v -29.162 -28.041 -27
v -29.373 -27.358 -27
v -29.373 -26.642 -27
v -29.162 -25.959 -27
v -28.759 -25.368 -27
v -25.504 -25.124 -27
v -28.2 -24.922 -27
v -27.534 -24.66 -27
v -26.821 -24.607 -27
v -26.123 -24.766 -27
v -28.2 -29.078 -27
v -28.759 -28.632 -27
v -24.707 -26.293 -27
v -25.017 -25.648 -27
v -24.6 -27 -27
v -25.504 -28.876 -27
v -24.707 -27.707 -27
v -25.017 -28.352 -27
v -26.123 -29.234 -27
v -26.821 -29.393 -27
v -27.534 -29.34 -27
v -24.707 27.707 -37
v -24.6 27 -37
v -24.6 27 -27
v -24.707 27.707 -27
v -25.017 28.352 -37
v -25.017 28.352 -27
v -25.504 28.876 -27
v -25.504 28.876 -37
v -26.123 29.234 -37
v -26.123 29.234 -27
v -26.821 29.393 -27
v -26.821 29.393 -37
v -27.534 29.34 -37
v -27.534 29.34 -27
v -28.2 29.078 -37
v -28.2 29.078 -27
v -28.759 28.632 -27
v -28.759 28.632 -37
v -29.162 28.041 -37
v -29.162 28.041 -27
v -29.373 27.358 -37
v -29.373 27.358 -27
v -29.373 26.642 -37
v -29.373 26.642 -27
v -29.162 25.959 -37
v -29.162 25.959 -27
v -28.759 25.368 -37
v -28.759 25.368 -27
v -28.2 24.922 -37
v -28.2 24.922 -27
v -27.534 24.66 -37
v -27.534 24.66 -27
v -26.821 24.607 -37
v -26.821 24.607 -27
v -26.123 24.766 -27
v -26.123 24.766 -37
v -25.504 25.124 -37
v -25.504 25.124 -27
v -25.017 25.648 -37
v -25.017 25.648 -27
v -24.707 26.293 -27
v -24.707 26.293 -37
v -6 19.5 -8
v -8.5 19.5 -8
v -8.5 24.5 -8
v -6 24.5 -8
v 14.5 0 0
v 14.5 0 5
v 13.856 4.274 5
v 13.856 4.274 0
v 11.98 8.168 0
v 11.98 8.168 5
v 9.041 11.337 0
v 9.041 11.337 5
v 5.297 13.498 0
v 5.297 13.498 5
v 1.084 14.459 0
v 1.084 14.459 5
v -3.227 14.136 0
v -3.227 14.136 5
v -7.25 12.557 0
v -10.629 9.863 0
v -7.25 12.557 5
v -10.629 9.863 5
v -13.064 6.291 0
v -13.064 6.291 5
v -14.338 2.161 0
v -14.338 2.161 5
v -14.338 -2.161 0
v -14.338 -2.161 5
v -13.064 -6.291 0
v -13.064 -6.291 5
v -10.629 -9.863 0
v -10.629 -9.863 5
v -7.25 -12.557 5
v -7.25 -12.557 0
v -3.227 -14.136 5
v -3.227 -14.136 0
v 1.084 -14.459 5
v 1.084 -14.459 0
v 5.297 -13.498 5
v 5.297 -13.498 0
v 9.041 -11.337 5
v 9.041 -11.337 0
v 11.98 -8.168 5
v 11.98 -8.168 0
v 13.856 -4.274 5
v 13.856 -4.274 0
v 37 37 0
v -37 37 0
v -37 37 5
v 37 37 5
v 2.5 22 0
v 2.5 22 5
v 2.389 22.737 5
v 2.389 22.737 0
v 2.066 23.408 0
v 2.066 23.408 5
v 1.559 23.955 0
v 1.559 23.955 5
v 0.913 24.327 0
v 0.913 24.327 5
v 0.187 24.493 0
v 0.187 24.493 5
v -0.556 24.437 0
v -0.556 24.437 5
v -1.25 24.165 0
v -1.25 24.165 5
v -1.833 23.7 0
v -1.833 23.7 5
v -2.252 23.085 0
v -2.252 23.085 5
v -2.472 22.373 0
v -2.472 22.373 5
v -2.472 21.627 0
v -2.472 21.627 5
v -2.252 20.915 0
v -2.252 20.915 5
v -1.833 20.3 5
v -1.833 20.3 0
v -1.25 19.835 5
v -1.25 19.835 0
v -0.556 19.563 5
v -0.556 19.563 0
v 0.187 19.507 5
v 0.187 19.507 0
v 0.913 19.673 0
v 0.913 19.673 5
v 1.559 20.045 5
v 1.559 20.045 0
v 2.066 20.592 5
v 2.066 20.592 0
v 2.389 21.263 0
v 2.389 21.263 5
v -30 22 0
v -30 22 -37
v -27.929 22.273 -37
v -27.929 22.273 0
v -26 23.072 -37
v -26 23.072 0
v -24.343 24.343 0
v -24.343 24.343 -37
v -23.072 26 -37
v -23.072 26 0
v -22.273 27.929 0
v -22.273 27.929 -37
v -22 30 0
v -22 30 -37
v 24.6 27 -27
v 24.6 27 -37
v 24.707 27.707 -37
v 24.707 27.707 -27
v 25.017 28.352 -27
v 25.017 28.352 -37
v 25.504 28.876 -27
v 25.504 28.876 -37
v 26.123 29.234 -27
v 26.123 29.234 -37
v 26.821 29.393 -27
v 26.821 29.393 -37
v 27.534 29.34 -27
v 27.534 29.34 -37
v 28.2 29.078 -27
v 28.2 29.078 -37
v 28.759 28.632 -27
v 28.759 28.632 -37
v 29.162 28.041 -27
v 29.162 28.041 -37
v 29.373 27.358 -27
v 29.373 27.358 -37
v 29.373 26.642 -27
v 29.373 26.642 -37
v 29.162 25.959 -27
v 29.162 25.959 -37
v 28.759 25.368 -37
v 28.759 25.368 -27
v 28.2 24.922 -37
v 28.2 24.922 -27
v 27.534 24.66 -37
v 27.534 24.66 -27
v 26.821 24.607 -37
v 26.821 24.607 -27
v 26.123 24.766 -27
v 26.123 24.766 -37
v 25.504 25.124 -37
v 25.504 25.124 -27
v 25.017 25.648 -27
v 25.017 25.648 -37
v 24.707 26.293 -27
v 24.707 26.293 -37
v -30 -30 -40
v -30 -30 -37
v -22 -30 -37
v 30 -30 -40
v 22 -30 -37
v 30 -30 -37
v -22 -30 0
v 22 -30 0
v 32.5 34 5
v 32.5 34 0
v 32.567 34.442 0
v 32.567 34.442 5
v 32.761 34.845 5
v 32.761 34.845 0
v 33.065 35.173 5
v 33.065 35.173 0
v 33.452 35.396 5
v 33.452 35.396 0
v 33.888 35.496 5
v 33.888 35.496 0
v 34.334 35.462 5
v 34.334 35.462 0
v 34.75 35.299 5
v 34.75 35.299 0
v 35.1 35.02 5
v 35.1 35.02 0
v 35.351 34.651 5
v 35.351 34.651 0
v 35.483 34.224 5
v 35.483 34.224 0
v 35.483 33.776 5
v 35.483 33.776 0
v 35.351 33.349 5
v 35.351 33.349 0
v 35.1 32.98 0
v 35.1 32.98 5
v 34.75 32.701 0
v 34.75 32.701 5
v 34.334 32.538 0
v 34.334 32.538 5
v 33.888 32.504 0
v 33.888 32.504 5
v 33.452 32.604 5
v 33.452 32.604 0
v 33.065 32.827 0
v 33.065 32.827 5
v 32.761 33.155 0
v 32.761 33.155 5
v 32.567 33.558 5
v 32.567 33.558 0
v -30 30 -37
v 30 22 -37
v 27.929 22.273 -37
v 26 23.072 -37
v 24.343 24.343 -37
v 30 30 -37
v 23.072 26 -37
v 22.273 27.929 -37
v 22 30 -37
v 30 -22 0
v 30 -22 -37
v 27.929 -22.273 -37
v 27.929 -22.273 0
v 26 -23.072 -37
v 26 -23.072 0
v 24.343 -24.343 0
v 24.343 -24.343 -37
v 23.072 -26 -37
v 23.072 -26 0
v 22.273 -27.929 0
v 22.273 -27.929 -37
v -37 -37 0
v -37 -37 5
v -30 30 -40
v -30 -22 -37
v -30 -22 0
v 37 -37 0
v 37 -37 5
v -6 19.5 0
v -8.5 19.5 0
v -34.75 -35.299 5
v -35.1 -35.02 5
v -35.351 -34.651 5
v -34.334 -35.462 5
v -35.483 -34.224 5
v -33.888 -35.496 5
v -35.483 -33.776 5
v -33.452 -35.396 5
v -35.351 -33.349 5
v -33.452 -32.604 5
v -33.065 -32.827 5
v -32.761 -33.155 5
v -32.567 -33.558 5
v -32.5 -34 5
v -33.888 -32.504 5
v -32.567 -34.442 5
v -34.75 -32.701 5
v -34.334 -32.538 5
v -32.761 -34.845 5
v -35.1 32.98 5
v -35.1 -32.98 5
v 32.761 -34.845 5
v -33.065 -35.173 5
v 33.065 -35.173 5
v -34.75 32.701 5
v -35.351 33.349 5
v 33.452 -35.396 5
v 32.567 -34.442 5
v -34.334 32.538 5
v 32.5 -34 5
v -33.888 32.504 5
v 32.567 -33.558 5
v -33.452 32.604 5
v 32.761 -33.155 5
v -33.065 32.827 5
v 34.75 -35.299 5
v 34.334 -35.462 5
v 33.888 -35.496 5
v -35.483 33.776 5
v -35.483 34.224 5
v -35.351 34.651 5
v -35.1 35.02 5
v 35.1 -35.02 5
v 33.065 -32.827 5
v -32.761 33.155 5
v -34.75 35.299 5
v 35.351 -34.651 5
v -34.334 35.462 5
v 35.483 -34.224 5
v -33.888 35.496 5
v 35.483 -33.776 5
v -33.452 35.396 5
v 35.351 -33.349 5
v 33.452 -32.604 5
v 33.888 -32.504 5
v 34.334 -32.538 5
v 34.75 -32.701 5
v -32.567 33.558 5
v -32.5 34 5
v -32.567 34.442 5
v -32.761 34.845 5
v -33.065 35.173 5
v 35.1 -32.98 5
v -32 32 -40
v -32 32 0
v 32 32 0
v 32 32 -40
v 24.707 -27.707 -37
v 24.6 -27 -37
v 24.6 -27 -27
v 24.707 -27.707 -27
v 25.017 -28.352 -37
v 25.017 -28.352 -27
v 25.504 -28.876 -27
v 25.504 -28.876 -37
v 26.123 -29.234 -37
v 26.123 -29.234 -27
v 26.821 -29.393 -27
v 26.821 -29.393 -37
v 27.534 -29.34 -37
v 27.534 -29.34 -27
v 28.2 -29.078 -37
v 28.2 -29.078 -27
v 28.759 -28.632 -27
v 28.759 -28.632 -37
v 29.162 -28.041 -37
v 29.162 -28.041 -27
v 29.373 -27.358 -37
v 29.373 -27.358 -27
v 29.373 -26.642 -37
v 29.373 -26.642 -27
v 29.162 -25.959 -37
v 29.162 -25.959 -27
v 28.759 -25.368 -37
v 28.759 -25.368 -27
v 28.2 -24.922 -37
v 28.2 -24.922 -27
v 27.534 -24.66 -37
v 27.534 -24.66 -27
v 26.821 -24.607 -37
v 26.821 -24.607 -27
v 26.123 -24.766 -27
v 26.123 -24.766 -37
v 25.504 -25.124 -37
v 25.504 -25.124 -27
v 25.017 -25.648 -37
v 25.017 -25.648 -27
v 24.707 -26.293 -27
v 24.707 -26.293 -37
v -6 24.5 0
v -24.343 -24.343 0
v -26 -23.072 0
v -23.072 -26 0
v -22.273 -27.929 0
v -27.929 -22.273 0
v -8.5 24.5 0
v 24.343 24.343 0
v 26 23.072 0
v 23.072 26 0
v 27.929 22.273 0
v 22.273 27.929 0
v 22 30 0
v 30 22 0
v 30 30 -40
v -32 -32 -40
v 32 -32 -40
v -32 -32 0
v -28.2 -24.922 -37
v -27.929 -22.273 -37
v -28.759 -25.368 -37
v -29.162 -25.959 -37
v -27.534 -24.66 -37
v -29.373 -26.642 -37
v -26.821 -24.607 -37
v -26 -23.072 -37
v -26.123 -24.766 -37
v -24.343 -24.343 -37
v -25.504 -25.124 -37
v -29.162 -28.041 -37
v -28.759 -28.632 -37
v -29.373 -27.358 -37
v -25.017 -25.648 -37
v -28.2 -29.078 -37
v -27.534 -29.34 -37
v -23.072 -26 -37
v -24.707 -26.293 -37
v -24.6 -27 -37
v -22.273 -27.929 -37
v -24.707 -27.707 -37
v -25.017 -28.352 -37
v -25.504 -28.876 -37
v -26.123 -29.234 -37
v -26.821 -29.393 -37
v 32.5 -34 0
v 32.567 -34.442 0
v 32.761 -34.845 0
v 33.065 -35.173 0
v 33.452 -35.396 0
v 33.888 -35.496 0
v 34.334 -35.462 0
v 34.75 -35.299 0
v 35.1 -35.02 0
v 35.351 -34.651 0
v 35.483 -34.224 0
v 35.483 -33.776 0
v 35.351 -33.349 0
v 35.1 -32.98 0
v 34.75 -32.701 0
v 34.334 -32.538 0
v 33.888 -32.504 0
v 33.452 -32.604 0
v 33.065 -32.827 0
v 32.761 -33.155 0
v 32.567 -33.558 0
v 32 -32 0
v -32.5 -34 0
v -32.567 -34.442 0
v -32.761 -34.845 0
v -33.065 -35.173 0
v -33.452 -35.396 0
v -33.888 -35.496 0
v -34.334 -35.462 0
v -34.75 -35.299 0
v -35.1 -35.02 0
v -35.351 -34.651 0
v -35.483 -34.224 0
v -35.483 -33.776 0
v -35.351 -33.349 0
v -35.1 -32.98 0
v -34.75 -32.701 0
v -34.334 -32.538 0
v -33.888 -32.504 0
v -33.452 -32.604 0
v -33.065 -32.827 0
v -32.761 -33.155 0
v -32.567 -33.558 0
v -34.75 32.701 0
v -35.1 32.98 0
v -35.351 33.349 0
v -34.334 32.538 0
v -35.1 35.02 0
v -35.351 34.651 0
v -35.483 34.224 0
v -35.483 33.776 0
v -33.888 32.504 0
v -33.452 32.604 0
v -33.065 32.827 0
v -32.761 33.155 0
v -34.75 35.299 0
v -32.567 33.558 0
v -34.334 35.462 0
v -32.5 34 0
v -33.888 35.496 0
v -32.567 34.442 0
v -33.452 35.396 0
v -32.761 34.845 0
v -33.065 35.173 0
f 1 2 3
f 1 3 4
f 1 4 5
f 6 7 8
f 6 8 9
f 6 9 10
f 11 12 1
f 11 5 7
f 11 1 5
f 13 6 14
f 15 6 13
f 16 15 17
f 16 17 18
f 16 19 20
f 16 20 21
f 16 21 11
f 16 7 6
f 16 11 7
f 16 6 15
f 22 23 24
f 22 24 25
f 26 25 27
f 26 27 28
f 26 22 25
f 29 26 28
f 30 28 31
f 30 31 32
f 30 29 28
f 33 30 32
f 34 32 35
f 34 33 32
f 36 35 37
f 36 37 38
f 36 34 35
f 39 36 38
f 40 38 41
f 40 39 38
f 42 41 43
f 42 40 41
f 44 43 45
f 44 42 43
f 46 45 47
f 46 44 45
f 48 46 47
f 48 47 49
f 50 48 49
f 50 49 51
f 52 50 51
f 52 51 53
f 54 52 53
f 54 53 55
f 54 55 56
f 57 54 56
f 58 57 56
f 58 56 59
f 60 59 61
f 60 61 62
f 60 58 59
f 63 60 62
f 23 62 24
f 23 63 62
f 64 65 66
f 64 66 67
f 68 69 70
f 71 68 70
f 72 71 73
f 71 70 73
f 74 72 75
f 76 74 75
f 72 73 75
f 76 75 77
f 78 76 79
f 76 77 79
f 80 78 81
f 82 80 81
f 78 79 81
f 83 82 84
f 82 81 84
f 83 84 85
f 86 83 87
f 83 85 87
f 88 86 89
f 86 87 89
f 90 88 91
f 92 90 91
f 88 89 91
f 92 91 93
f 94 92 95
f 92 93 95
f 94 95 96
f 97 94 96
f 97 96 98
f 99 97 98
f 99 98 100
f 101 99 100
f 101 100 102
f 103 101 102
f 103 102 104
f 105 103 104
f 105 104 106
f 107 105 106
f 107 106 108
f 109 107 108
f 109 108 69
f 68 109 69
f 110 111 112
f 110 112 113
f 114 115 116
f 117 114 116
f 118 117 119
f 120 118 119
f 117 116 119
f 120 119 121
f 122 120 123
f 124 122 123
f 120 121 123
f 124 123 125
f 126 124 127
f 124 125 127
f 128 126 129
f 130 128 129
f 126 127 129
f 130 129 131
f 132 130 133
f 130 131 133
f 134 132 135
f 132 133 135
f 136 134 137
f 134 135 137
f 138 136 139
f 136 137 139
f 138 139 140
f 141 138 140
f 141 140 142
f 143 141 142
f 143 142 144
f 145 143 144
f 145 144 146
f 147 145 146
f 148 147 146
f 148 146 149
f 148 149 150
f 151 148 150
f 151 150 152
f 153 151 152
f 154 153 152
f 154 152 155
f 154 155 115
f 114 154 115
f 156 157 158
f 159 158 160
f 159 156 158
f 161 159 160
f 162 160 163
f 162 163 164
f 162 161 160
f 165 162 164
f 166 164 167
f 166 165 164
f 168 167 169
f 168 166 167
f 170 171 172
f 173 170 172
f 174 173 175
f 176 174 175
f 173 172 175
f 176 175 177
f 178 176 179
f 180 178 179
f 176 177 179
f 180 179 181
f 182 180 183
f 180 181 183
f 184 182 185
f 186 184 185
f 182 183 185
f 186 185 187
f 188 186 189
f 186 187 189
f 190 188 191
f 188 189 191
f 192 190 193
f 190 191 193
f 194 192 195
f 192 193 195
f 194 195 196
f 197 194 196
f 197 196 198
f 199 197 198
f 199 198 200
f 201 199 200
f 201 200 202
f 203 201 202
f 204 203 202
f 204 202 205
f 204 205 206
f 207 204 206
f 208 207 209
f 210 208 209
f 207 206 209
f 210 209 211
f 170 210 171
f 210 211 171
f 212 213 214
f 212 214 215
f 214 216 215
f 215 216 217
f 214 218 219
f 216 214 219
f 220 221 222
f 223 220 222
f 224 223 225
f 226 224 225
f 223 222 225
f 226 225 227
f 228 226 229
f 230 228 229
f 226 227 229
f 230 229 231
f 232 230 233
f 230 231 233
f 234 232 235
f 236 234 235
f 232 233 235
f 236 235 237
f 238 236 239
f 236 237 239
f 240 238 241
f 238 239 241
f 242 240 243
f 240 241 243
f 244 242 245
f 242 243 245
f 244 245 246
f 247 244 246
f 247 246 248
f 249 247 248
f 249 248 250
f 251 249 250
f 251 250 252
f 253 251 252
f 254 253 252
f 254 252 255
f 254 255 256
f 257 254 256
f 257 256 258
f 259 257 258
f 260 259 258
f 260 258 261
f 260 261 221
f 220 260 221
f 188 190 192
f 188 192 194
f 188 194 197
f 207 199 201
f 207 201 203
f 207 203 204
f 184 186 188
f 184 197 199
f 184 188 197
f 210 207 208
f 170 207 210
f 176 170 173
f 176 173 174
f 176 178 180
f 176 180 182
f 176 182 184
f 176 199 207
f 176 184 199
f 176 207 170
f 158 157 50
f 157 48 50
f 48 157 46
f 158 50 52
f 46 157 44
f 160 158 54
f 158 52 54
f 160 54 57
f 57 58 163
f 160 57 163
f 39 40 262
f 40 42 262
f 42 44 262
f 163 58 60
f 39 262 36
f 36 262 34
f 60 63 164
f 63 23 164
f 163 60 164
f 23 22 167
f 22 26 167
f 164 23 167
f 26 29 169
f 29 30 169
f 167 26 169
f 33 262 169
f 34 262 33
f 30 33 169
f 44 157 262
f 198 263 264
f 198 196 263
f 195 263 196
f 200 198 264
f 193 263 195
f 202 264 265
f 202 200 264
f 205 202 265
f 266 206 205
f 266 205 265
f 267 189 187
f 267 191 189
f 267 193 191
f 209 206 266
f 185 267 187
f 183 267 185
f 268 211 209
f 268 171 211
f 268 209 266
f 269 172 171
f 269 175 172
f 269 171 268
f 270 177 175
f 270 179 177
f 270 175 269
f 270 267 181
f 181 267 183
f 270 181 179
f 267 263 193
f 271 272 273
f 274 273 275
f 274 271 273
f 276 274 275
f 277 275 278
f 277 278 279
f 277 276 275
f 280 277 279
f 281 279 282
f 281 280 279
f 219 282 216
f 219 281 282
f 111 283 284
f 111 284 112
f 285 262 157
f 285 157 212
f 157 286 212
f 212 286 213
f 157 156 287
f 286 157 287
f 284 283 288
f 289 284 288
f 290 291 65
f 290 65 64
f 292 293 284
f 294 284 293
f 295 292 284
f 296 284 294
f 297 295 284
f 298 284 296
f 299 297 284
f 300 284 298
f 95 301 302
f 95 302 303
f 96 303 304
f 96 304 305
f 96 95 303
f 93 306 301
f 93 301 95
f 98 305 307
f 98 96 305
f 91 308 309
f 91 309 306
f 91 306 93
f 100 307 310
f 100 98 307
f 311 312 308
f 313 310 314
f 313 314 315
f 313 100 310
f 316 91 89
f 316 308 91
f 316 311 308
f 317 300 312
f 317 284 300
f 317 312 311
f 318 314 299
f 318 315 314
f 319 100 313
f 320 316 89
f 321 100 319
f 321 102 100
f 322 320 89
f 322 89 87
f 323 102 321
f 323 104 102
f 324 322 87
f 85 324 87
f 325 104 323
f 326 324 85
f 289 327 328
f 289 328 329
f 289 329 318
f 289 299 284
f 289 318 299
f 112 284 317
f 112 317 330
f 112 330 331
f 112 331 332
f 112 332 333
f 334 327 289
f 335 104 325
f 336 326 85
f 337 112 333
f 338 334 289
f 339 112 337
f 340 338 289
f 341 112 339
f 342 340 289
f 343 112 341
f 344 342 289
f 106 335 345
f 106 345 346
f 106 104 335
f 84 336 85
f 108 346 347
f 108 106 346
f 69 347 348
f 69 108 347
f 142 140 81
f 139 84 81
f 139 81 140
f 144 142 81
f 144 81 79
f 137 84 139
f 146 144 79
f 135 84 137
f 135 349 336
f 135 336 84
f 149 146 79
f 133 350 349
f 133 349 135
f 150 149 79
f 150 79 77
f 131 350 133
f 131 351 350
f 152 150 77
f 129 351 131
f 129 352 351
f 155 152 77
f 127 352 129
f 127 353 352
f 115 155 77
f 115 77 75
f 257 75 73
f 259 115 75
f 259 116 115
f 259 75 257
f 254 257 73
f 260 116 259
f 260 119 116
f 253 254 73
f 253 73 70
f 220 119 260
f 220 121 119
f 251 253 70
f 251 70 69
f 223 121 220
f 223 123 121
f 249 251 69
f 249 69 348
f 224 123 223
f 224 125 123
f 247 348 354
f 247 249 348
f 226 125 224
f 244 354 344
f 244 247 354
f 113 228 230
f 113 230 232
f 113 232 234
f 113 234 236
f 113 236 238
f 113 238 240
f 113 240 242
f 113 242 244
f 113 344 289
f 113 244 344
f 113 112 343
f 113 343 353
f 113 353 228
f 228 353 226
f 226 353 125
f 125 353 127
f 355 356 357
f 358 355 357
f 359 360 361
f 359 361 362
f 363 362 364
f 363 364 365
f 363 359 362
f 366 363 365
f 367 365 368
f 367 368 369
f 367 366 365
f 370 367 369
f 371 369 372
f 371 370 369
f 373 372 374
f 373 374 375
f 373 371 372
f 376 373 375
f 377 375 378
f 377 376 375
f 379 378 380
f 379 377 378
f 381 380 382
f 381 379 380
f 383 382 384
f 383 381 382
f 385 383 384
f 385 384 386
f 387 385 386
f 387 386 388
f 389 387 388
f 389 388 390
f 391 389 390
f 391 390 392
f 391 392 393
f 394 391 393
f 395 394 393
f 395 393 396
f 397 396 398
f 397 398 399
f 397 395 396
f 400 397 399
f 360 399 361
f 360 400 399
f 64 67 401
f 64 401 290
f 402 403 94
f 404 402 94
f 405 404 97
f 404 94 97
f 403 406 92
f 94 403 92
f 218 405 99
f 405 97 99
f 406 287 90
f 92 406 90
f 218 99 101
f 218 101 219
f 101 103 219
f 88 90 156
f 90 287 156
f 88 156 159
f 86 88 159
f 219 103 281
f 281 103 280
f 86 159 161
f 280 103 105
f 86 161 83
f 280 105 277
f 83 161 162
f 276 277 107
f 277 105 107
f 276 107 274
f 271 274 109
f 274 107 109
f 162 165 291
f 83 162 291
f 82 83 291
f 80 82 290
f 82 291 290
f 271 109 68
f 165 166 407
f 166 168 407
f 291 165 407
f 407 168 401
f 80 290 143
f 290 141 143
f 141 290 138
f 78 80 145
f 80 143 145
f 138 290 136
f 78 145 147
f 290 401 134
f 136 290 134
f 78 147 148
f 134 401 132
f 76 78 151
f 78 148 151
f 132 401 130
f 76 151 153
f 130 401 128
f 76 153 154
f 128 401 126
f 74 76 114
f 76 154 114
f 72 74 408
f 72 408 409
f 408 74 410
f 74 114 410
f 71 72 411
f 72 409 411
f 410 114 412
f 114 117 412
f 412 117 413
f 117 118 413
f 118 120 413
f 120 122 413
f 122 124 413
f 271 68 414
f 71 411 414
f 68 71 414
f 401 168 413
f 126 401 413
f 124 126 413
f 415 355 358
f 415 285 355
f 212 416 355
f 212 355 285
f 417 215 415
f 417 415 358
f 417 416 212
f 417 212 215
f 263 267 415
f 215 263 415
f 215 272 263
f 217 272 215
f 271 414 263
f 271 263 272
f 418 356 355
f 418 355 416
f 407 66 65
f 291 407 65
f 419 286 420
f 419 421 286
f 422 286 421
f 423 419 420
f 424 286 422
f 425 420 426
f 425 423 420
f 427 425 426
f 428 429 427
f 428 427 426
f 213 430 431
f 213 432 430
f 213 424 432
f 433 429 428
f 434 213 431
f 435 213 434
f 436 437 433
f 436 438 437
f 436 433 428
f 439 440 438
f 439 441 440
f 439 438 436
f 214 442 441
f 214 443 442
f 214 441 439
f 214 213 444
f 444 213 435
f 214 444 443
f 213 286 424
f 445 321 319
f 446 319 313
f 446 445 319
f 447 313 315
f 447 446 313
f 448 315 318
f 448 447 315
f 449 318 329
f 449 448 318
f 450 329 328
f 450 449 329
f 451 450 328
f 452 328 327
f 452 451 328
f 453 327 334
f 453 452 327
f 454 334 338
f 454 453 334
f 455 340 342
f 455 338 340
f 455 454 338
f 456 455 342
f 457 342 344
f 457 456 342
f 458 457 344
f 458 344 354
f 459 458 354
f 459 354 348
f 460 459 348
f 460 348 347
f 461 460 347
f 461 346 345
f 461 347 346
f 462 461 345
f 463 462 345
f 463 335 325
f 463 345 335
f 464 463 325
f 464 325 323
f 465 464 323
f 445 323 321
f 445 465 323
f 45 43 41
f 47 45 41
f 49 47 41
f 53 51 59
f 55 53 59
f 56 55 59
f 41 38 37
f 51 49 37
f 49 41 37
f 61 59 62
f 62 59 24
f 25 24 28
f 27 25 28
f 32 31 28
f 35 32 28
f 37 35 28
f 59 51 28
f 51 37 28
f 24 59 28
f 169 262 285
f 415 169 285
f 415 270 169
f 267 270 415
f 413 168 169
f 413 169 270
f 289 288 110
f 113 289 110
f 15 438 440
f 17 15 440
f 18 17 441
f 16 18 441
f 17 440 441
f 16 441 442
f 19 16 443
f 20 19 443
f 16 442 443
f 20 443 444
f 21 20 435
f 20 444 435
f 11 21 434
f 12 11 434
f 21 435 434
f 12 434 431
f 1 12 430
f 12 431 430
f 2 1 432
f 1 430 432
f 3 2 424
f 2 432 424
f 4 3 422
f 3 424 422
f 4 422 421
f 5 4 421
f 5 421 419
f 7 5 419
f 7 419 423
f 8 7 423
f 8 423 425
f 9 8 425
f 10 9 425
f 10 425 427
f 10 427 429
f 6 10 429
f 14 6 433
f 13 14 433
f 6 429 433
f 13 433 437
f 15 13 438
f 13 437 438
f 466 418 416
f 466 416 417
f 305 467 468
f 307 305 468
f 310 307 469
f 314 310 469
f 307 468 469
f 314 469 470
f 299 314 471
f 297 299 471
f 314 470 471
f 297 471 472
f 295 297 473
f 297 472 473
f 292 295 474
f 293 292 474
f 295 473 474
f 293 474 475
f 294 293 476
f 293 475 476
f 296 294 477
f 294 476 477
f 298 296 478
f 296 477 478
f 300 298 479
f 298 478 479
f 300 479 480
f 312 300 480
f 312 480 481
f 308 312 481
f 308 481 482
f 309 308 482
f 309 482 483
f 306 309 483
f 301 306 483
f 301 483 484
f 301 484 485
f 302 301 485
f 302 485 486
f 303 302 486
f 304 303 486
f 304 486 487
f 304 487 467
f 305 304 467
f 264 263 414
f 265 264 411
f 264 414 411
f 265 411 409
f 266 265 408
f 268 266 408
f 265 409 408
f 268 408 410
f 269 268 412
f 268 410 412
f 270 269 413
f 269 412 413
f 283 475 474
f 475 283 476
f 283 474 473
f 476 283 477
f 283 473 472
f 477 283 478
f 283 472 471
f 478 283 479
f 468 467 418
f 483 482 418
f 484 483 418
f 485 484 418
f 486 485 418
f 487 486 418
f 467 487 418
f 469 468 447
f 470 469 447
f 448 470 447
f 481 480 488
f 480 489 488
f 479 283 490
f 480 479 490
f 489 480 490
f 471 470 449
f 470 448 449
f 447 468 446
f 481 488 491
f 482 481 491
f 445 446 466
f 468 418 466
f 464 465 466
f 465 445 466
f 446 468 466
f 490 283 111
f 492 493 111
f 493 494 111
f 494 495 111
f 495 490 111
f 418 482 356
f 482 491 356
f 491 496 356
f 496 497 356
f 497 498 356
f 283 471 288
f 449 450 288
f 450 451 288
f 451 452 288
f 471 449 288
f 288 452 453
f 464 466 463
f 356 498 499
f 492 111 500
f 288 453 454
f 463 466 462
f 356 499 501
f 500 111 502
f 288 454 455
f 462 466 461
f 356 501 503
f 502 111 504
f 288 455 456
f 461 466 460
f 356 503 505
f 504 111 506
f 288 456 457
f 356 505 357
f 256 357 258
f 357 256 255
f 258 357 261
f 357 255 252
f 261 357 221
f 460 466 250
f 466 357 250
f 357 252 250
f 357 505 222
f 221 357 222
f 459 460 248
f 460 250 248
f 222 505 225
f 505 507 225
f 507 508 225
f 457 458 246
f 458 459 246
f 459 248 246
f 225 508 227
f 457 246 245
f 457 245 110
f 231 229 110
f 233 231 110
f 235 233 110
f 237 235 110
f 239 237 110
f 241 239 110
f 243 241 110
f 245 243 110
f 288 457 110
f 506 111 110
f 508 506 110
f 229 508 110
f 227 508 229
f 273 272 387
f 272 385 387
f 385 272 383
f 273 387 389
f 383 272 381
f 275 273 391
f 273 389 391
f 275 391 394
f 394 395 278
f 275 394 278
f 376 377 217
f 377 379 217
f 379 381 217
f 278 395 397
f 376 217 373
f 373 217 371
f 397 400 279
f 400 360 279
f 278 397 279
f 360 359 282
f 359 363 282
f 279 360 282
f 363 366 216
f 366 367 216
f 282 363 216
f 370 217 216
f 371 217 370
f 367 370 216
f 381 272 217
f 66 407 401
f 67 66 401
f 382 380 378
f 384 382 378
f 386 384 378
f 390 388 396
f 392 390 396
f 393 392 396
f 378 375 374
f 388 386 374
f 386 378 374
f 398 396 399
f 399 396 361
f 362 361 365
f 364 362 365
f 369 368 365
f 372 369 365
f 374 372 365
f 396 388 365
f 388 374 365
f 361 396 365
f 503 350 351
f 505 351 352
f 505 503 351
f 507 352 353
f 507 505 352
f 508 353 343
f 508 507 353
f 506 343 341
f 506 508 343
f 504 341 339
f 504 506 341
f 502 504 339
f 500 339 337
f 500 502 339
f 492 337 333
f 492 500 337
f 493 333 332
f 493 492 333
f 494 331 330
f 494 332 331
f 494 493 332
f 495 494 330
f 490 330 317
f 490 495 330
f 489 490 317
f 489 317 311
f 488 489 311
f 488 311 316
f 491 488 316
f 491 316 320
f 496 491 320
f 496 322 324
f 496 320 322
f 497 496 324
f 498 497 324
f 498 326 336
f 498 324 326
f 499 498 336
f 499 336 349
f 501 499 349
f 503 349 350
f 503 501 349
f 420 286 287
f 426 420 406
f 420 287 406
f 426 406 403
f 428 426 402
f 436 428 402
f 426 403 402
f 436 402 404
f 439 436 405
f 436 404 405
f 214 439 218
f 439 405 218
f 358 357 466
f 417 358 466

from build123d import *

# Parameters (mm, degrees)
SKETCH_W                   = 74
SKETCH_H                   = 74
PAD_DEPTH                  = 5
SKETCH002_W                = 64
SKETCH002_H                = 64
SKETCH002_W_2              = 60
SKETCH002_H_2              = 60
PAD001_DEPTH               = 40
SKETCH003_R                = 1.5
POCKET_DEPTH               = 232.834272
PAD002_DEPTH               = 37
SKETCH005_R                = 2.4
POCKET001_DEPTH            = 10
SKETCH003_MIRRORED_2_R     = 1.5
POCKET_MIRRORED_2_DEPTH    = 232.834272
PAD002_MIRRORED_2_DEPTH    = 37
SKETCH005_MIRRORED_2_R     = 2.4
POCKET001_MIRRORED_2_DEPTH = 10
SKETCH006_R                = 14.5
SKETCH006_R_2              = 2.5
POCKET002_DEPTH            = 45.001
SKETCH007_W                = 2.5
SKETCH007_H                = 5
PAD003_DEPTH               = 8


with BuildPart() as part:
    # Sketch → Pad (new body)
    with BuildSketch(Plane.XY):
        Rectangle(SKETCH_W, SKETCH_H)
    extrude(amount=PAD_DEPTH)

    # Sketch002 (on Face5 of Pad) → Pad001 (join)
    with BuildSketch(Plane(origin=(0, 0, 0), x_dir=(1, 0, 0), z_dir=(0, 0, -1))):
        Rectangle(SKETCH002_W, SKETCH002_H)
        Rectangle(SKETCH002_W_2, SKETCH002_H_2, mode=Mode.SUBTRACT)
    extrude(amount=PAD001_DEPTH)

    # Sketch003 (on Face4 of Pad001) → Pocket (cut, through all)
    with BuildSketch(Plane(origin=(0, 0, 0), x_dir=(1, 0, 0), z_dir=(0, 0, -1))):
        with Locations((-34, 34)):
            Circle(SKETCH003_R)
    pocket = extrude(amount=-POCKET_DEPTH, mode=Mode.SUBTRACT)

    # Sketch004 (on Face17 of Pocket) → Pad002 (join)
    with BuildSketch(Plane(origin=(0, 0, 0), x_dir=(1, 0, 0), z_dir=(0, 0, -1))):
        with BuildLine():
            ThreePointArc((-30, 22), (-24.343146, 24.343146), (-22, 30))
            Line((-30, 30), (-22, 30))
            Line((-30, 30), (-30, 22))
        make_face()
    pad002 = extrude(amount=PAD002_DEPTH)

    # Sketch005 (on Face17 of Pad002) → Pocket001 (cut)
    with BuildSketch(Plane(origin=(0, 0, -37), x_dir=(1, 0, 0), z_dir=(0, 0, -1))):
        with Locations((-27, 27)):
            Circle(SKETCH005_R)
    pocket001 = extrude(amount=-POCKET001_DEPTH, mode=Mode.SUBTRACT)

    # Sketch003 Mirrored 2 → Pocket Mirrored 2 (cut, through all)
    with BuildSketch(Plane(origin=(0, 0, 0), x_dir=(-1, 0, 0), z_dir=(0, 0, 1))):
        with Locations((-34, 34)):
            Circle(SKETCH003_MIRRORED_2_R)
    pocket_mirrored_2 = extrude(amount=POCKET_MIRRORED_2_DEPTH, mode=Mode.SUBTRACT)

    # Sketch004 Mirrored 2 → Pad002 Mirrored 2 (add)
    with BuildSketch(Plane(origin=(0, 0, 0), x_dir=(-1, 0, 0), z_dir=(0, 0, 1))):
        with BuildLine():
            ThreePointArc((-30, 22), (-24.343146, 24.343146), (-22, 30))
            Line((-30, 30), (-22, 30))
            Line((-30, 30), (-30, 22))
        make_face()
    pad002_mirrored_2 = extrude(amount=-PAD002_MIRRORED_2_DEPTH)

    # Sketch005 Mirrored 2 → Pocket001 Mirrored 2 (cut)
    with BuildSketch(Plane(origin=(0, 0, -37), x_dir=(-1, 0, 0), z_dir=(0, 0, 1))):
        with Locations((-27, 27)):
            Circle(SKETCH005_MIRRORED_2_R)
    pocket001_mirrored_2 = extrude(amount=POCKET001_MIRRORED_2_DEPTH, mode=Mode.SUBTRACT)

    # Mirrored001: Pocket, Pad002, Pocket001, Pocket Mirrored 2, Pad002 Mirrored 2, Pocket001 Mirrored 2 across Sketch003 H_Axis
    add(pocket.mirror(Plane(origin=(0, 0, 0), x_dir=(0, 0, -1), z_dir=(0, -1, 0))), mode=Mode.SUBTRACT)
    add(pad002.mirror(Plane(origin=(0, 0, 0), x_dir=(0, 0, -1), z_dir=(0, -1, 0))))
    add(pocket001.mirror(Plane(origin=(0, 0, 0), x_dir=(0, 0, -1), z_dir=(0, -1, 0))), mode=Mode.SUBTRACT)
    add(pocket_mirrored_2.mirror(Plane(origin=(0, 0, 0), x_dir=(0, 0, -1), z_dir=(0, -1, 0))), mode=Mode.SUBTRACT)
    add(pad002_mirrored_2.mirror(Plane(origin=(0, 0, 0), x_dir=(0, 0, -1), z_dir=(0, -1, 0))))
    add(pocket001_mirrored_2.mirror(Plane(origin=(0, 0, 0), x_dir=(0, 0, -1), z_dir=(0, -1, 0))), mode=Mode.SUBTRACT)

    # Sketch006 (on Face36 of MultiTransform) → Pocket002 (cut, through all)
    with BuildSketch(Plane.XY.offset(5)):
        Circle(SKETCH006_R)
        with Locations((0, 22)):
            Circle(SKETCH006_R_2)
    extrude(amount=-POCKET002_DEPTH, mode=Mode.SUBTRACT)

    # Sketch007 (on Face4 of Pocket002) → Pad003 (join)
    with BuildSketch(Plane(origin=(0, 0, 0), x_dir=(1, 0, 0), z_dir=(0, 0, -1))):
        with Locations((-7.25, -22)):
            Rectangle(SKETCH007_W, SKETCH007_H)
    extrude(amount=PAD003_DEPTH)


solid = part.part
